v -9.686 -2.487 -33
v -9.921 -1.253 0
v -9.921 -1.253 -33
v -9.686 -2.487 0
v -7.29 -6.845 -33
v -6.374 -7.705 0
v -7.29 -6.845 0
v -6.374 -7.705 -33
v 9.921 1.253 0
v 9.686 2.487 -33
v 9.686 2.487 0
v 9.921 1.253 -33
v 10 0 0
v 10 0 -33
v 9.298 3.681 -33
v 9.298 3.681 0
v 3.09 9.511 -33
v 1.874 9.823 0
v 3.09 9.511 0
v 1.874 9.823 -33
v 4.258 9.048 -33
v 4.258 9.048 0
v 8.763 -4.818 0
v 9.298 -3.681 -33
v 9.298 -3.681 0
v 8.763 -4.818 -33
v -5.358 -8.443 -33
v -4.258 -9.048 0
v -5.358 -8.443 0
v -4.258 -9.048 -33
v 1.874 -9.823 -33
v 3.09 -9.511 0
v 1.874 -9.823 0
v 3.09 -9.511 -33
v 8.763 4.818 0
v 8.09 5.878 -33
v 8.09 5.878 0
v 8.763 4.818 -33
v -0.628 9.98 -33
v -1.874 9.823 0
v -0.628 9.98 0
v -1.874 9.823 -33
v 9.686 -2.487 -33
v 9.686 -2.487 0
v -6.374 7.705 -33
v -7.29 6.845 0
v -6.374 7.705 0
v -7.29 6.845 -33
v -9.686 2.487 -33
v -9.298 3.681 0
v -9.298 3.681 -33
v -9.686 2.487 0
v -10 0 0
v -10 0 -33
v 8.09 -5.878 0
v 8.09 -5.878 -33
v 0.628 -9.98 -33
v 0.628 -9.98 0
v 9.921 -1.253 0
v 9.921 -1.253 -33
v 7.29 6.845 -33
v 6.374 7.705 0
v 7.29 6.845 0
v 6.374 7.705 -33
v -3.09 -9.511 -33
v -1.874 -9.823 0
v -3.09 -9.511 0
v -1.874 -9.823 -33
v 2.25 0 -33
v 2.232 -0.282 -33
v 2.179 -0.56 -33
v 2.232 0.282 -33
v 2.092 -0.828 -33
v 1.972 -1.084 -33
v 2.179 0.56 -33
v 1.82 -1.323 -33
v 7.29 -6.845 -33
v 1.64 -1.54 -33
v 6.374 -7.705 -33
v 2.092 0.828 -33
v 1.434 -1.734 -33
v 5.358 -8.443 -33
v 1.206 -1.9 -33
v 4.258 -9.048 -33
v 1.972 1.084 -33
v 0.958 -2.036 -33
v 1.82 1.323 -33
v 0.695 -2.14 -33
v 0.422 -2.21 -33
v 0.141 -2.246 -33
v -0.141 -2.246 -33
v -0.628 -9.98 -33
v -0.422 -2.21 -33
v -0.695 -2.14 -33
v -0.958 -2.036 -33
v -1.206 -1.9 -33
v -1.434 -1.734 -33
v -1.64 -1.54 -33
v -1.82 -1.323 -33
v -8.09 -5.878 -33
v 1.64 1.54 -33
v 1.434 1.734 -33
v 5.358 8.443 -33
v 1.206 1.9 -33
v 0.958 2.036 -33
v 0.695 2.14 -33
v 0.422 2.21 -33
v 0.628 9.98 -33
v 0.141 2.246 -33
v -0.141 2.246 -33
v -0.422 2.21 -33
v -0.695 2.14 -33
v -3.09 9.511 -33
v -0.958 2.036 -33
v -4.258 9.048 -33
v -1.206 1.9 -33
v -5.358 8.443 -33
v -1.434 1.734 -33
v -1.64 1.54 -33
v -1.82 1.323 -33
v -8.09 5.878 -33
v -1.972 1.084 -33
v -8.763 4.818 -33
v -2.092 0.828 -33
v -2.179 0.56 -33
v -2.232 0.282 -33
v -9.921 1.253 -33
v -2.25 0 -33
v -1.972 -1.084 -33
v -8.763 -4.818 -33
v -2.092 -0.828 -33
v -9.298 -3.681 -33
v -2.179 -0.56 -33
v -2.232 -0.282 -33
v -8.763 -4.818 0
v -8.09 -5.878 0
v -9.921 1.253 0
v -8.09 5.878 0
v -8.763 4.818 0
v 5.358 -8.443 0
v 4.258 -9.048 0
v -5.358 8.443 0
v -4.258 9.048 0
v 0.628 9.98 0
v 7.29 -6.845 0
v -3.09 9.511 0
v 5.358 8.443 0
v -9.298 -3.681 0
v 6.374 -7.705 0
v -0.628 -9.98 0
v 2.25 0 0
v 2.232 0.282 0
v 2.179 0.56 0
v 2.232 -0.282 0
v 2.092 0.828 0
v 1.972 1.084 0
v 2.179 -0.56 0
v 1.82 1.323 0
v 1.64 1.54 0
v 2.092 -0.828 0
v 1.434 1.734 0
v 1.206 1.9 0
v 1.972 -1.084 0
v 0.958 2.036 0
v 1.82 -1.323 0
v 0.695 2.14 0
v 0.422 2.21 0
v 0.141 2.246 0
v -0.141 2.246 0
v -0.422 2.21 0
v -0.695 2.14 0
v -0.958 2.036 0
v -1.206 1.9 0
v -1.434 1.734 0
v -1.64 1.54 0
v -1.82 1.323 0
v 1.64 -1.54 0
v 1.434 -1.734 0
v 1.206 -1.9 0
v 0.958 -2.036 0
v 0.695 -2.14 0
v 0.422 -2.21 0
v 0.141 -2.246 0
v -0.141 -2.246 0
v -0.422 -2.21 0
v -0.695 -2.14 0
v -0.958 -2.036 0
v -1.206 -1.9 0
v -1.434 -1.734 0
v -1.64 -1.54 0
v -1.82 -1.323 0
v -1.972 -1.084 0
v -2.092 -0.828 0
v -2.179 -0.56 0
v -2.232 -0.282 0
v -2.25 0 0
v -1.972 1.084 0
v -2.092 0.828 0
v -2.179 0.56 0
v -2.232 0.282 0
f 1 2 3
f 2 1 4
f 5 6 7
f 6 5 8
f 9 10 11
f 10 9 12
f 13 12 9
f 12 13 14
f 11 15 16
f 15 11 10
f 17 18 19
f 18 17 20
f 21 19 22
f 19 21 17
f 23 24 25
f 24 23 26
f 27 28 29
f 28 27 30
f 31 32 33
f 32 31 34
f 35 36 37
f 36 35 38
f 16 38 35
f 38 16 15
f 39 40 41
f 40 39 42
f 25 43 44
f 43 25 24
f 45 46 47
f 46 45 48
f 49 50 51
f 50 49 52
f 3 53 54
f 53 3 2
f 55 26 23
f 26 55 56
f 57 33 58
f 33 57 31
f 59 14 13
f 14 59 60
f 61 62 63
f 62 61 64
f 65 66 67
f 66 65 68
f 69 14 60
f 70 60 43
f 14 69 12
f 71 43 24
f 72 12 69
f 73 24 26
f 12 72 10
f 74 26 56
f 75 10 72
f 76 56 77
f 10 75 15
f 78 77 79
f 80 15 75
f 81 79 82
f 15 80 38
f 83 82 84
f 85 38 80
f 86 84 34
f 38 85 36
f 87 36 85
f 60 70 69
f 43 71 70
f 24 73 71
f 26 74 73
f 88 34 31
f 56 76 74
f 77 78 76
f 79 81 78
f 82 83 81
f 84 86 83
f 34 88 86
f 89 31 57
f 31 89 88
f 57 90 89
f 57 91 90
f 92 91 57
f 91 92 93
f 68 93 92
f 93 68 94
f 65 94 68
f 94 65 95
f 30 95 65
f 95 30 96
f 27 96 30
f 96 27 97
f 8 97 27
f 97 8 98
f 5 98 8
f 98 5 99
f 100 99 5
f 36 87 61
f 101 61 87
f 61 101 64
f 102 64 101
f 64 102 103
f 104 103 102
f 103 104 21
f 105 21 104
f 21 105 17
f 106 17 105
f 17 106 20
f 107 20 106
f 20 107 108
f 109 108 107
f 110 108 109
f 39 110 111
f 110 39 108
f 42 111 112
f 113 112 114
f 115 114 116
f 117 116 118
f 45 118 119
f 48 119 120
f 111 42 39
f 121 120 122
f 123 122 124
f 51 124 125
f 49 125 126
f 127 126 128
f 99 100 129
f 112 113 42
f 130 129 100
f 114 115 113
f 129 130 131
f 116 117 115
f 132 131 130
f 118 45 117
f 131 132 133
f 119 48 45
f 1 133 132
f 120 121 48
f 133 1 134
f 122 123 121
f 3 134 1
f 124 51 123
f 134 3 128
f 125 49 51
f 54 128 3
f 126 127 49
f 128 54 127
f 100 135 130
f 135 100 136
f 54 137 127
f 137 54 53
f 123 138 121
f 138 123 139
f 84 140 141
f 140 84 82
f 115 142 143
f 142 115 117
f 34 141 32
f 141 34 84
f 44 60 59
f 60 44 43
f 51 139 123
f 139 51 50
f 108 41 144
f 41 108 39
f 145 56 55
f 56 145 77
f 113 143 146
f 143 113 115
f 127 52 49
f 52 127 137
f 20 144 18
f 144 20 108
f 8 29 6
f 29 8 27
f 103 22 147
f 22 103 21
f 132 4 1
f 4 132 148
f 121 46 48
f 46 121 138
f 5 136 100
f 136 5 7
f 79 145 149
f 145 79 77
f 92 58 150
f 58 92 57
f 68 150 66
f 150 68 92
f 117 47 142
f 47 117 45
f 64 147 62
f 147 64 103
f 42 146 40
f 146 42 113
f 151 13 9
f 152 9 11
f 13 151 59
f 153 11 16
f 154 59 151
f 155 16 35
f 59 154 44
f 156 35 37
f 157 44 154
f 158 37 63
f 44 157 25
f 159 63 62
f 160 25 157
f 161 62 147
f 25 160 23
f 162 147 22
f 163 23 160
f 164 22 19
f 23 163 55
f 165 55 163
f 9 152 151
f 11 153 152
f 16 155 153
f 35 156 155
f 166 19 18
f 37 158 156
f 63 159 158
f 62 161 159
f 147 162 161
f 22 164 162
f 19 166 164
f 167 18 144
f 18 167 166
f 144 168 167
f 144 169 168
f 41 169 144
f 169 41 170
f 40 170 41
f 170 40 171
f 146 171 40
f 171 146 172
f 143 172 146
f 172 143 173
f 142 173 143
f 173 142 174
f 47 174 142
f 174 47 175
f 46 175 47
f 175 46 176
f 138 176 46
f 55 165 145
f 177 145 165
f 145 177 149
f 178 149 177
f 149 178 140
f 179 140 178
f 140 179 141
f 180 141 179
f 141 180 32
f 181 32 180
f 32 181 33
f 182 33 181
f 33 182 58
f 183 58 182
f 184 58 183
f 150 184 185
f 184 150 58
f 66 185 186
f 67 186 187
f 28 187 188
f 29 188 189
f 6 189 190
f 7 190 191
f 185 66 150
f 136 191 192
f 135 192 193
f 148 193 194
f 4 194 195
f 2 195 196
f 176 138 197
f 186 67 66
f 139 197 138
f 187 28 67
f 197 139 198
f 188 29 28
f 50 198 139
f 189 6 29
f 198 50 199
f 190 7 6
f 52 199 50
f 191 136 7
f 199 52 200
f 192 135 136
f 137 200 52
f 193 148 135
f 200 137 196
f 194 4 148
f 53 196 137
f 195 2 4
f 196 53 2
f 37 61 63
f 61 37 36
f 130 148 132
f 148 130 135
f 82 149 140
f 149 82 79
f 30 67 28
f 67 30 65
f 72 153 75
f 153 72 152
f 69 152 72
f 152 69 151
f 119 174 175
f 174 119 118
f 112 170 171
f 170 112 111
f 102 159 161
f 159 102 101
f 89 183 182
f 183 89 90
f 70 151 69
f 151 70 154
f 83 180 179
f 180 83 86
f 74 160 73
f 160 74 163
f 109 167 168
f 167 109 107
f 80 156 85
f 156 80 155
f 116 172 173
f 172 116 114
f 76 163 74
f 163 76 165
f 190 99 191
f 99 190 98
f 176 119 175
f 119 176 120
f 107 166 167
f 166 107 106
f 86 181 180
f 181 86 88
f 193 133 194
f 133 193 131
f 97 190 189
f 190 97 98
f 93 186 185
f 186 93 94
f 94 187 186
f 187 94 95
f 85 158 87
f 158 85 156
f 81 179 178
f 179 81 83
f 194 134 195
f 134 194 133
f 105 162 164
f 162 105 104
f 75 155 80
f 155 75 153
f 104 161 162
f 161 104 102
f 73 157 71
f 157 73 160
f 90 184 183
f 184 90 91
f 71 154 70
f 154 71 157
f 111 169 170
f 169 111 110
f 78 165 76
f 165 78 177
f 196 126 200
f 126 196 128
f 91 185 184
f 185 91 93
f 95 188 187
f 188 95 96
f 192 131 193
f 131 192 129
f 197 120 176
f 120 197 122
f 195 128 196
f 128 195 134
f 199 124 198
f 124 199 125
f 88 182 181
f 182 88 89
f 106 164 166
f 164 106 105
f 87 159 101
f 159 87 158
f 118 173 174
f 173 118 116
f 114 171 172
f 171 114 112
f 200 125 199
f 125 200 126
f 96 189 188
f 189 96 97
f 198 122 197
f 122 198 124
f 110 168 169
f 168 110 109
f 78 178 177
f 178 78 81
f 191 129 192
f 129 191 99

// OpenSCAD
$fn = 50;


difference() {
	union() {
		translate(v = [0, 0, -33.0000000000]) {
			cylinder(h = 33, r = 10.0000000000);
		}
		cylinder(h = 0, r = 16.0000000000);
	}
	union() {
		#translate(v = [0, 0, -33]) {
			cylinder(h = 33, r = 2.2500000000);
		}
	}
}
